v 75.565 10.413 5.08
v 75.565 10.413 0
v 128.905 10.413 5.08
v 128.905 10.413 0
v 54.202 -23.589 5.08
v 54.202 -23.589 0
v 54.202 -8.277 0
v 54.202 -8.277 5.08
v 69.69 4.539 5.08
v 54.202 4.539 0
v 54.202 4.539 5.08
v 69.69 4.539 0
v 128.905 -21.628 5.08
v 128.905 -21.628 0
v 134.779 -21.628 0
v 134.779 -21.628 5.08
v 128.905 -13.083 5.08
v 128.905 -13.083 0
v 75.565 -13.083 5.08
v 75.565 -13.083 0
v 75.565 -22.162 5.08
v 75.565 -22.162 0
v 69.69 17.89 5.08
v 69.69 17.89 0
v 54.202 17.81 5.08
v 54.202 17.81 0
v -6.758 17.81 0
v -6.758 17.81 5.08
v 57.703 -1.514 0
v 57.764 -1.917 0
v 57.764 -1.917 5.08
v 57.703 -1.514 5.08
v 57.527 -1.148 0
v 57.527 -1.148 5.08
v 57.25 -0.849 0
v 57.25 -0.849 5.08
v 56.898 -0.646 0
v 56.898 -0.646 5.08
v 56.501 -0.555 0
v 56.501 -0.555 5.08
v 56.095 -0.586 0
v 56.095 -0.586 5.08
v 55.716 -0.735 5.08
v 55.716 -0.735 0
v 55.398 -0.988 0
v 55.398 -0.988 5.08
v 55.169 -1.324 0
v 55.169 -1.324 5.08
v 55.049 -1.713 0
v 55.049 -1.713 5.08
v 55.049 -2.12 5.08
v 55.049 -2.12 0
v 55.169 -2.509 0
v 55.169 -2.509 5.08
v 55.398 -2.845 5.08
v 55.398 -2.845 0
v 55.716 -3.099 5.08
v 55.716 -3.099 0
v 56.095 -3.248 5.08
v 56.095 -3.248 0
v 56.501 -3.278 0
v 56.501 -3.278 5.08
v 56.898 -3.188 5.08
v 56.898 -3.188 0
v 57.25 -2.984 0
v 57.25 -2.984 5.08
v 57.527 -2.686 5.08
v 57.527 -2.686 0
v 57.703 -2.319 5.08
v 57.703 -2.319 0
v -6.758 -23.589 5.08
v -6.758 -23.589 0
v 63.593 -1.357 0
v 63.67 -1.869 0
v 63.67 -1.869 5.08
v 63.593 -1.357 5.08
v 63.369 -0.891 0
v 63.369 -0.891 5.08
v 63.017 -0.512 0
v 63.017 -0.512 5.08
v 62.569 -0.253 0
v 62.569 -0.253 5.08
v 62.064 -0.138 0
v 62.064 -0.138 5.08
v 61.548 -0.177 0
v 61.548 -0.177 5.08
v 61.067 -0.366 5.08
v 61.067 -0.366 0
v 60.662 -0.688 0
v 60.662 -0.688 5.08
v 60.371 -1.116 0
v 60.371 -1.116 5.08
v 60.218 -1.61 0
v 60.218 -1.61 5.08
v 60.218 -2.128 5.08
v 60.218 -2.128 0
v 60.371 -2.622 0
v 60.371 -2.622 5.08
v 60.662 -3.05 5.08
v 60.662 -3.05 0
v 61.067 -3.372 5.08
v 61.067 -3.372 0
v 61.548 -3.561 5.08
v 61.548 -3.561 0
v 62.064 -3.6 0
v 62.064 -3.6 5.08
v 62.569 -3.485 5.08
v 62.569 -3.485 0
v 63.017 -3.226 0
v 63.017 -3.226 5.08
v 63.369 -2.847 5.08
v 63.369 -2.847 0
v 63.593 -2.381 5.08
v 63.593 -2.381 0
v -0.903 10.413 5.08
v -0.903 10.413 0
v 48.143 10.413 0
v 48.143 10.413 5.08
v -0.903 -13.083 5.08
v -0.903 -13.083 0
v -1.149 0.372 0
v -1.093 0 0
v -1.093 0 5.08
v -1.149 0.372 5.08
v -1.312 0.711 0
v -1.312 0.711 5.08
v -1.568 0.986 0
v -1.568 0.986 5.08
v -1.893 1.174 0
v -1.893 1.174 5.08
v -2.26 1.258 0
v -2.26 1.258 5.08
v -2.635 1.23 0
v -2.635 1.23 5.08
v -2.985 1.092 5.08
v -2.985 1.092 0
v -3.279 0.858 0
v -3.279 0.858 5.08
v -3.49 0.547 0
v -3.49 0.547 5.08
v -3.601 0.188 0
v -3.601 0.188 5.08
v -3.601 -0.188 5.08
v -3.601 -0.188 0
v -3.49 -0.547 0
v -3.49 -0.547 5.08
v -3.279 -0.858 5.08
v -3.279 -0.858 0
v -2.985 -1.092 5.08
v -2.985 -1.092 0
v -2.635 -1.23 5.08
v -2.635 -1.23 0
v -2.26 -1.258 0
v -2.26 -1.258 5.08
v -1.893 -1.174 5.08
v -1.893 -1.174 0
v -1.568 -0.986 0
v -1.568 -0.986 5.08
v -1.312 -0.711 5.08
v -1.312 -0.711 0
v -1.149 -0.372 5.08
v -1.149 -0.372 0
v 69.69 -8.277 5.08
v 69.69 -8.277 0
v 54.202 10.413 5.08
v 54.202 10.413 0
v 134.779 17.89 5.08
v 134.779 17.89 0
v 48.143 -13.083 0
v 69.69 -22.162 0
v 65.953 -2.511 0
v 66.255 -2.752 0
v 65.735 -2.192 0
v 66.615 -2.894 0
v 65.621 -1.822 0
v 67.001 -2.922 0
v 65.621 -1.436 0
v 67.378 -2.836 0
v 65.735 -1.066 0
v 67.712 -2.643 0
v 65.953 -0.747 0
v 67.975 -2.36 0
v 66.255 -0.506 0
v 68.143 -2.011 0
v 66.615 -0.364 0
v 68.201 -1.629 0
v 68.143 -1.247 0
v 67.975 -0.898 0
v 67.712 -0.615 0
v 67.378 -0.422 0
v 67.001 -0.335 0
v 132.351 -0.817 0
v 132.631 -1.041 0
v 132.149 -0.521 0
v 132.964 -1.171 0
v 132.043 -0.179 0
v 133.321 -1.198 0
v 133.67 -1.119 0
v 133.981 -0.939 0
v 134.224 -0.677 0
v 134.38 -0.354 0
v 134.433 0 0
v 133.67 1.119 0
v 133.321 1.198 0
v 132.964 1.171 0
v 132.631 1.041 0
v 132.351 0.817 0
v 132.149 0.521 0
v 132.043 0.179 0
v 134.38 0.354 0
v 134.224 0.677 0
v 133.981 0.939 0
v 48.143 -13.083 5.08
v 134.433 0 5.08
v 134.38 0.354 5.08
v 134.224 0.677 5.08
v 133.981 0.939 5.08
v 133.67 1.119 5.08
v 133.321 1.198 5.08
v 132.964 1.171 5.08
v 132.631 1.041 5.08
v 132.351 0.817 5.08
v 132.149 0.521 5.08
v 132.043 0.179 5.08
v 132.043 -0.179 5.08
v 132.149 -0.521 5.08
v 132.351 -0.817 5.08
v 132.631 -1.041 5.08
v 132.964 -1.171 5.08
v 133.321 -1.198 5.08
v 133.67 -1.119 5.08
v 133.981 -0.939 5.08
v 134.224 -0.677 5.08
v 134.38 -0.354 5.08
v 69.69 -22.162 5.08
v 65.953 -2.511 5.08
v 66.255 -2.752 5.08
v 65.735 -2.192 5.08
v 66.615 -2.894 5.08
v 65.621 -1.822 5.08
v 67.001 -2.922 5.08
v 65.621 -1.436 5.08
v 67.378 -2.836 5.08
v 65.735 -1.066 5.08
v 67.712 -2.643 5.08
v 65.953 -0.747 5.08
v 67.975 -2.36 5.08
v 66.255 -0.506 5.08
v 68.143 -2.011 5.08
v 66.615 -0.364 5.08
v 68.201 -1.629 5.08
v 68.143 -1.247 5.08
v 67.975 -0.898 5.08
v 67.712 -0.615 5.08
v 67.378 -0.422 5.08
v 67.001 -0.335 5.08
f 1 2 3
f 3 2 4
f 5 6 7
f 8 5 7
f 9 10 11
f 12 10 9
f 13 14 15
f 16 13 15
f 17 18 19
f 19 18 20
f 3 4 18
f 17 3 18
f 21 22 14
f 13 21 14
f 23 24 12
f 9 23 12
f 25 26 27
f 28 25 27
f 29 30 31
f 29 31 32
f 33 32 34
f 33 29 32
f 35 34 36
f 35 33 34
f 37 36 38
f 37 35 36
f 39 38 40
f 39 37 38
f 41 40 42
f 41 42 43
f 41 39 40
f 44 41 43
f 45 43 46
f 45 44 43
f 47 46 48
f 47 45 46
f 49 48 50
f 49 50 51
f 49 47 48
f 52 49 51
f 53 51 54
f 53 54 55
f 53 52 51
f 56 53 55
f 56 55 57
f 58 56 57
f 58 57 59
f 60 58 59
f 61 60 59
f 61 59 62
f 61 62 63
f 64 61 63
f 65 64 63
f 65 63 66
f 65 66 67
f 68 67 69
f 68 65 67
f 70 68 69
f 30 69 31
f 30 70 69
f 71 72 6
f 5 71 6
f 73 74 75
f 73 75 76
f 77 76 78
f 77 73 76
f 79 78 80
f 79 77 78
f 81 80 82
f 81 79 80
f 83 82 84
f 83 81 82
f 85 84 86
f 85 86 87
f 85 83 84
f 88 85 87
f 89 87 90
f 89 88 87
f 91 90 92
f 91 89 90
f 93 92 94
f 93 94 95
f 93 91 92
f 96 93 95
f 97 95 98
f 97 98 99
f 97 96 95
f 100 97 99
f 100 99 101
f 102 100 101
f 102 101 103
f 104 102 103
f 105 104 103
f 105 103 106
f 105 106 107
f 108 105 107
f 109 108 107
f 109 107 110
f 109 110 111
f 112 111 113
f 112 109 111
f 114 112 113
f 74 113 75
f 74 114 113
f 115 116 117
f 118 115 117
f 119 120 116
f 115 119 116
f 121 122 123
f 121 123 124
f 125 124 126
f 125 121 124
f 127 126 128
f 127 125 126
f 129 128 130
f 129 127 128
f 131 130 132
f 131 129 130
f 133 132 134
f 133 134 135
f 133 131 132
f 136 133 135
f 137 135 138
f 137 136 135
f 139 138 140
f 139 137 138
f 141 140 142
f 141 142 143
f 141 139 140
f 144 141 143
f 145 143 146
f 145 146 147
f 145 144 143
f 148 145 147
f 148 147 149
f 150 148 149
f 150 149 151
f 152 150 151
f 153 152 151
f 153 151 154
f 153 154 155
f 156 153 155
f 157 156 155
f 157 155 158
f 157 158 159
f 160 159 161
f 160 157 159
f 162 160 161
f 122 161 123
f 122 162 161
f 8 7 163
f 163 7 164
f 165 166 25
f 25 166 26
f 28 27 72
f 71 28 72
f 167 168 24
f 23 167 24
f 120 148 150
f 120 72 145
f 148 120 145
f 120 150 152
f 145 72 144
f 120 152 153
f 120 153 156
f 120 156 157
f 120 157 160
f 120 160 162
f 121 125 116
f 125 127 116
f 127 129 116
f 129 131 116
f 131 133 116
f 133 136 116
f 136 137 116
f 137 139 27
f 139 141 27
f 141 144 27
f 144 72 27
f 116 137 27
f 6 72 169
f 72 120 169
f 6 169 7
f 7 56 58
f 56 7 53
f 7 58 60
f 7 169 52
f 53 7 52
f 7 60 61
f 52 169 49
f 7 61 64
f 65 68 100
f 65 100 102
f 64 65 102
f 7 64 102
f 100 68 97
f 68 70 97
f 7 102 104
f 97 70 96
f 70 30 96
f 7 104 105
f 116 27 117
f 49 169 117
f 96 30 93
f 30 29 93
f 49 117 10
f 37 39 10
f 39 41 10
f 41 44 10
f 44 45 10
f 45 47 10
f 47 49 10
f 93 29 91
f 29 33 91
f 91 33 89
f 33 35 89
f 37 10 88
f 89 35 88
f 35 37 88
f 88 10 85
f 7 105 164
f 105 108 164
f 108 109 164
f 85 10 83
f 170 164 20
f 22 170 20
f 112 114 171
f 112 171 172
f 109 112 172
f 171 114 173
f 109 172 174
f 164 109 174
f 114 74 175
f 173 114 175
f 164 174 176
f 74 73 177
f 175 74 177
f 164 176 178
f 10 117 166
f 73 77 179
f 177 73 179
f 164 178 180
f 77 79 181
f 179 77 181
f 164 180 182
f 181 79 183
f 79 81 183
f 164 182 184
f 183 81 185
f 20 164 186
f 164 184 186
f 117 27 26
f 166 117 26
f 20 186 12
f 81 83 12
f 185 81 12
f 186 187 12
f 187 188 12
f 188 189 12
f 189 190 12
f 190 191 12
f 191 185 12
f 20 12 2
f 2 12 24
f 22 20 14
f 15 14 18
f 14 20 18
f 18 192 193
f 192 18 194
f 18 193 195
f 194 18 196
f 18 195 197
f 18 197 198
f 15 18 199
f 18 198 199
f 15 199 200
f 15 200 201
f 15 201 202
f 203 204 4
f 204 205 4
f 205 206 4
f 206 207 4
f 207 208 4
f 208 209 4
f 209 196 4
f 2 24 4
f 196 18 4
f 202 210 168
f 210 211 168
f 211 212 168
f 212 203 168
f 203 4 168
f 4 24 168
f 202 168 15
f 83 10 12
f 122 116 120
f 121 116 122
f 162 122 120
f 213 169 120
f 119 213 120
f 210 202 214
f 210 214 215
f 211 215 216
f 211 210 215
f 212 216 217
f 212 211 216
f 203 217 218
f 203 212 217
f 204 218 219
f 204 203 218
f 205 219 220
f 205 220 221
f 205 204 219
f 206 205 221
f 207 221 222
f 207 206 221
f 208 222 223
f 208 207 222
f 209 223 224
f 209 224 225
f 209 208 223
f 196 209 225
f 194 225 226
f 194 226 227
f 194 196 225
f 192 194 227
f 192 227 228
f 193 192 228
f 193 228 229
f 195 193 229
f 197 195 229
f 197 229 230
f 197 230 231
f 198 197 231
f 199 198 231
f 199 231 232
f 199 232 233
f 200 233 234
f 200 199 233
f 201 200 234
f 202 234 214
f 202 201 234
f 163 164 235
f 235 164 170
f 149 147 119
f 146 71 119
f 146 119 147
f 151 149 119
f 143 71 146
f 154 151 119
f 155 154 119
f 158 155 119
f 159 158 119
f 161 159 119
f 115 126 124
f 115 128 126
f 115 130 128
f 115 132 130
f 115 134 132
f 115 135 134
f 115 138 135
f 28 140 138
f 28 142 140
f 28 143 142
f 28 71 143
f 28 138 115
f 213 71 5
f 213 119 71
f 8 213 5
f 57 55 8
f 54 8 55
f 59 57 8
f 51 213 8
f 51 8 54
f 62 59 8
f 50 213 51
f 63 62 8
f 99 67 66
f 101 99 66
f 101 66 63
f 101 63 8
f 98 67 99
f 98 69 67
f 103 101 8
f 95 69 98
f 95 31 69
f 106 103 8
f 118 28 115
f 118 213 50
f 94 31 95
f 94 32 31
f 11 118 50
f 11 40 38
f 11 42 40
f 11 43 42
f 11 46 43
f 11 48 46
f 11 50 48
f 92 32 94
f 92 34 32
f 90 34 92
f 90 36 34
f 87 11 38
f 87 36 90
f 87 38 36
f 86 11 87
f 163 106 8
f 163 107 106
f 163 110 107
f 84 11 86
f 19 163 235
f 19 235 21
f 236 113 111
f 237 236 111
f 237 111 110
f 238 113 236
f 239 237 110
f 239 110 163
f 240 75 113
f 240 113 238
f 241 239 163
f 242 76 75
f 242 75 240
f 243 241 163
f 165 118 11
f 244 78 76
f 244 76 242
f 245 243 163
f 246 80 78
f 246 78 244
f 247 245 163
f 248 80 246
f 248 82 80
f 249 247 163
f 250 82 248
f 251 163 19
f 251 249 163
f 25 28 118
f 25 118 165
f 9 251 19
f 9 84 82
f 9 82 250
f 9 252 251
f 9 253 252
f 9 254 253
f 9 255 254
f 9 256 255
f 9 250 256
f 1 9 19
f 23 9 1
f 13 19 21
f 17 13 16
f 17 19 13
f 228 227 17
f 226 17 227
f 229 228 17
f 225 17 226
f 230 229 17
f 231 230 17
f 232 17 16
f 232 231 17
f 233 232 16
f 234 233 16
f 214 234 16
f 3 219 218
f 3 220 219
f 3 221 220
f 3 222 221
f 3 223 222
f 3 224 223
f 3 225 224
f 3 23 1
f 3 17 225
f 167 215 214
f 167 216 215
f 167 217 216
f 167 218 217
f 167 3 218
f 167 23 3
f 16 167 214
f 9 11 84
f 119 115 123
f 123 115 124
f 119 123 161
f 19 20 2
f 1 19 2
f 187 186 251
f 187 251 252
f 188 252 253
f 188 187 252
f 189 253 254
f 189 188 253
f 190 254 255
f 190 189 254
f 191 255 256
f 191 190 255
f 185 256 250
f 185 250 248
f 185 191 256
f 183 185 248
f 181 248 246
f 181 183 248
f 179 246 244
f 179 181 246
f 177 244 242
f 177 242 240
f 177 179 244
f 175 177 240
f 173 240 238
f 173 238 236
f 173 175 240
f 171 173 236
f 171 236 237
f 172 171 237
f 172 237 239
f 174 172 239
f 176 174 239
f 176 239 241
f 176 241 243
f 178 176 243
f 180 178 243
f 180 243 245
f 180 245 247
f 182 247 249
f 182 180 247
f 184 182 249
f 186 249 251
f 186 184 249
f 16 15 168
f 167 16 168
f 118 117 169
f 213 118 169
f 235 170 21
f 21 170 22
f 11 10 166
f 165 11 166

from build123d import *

# Parameters (mm, degrees)
F0_W     = 53.34
F0_H     = 7.4762164177
F1_DEPTH = 5.08
F0_W_2   = 15.4877182819
F0_H_2   = 12.8163710635
F0_R     = 1.365180055
F0_R_2   = 1.7356876501
F0_R_3   = 1.2971240832
F2_DEPTH = 5.08
F0_R_4   = 1.201625658
F0_W_3   = 6.0593526471
F0_H_3   = 10.5057700578
F0_W_4   = 49.0457672859
F0_H_4   = 7.3963825689
F0_W_5   = 5.854880067
F0_H_5   = 23.4966807871
F0_R_5   = 1.2613504397
F3_DEPTH = 5.08


with BuildPart() as f1:
    # F0 (on Top) → F1 (new body)
    with BuildSketch(Plane.XY):
        with Locations((102.2345048122, 14.151409833)):
            Rectangle(F0_W, F0_H)
        Polygon((128.9045048122, 10.4133016241), (131.6407098506, 10.4133016241), (134.779159077, 10.4133016241), (134.779159077, 17.8895180418), (128.9045048122, 17.8895180418), align=None)
        Polygon((128.9045048122, -21.6276271147), (128.9045048122, -13.083379163), (75.5645048122, -13.083379163), (75.5645048122, -20.5595947167), (75.5645048122, -22.1616424497), align=None)
        Polygon((75.5645048122, -13.083379163), (75.5645048122, 10.4133016241), (75.5645048122, 17.8895180418), (69.6898505475, 17.8895180418), (69.6898505475, 4.5391316433), (69.6898505475, -8.2772394202), (69.6898505475, -22.1616424497), (75.5645048122, -22.1616424497), (75.5645048122, -20.5595947167), align=None)
    extrude(amount=F1_DEPTH)

    # F0 (on Top) → F2 (join)
    with BuildSketch(Plane.XY):
        with Locations((61.9459914065, -1.8690538884)):
            Rectangle(F0_W_2, F0_H_2)
        with Locations((56.3987791538, -1.916793175)):
            Circle(F0_R, mode=Mode.SUBTRACT)
        with Locations((61.9344774574, -1.8690538884)):
            Circle(F0_R_2, mode=Mode.SUBTRACT)
        with Locations((66.9036880136, -1.6289874911)):
            Circle(F0_R_3, mode=Mode.SUBTRACT)
    extrude(amount=F2_DEPTH)

    # F0 (on Top) → F3 (join)
    with BuildSketch(Plane.XY):
        Polygon((134.779159077, 10.4133016241), (131.6407098506, 10.4133016241), (128.9045048122, 10.4133016241), (128.9045048122, -13.083379163), (131.6407098506, -13.083379163), (134.779159077, -13.083379163), align=None)
        with Locations((133.2313663255, 0)):
            Circle(F0_R_4, mode=Mode.SUBTRACT)
        Polygon((131.6407098506, -13.083379163), (128.9045048122, -13.083379163), (128.9045048122, -21.6276271147), (134.779159077, -21.6276271147), (134.779159077, -13.083379163), align=None)
        with Locations((51.1724559421, -18.3362641919)):
            Rectangle(F0_W_3, F0_H_3)
        with Locations((23.6198959756, -18.3362641919)):
            Rectangle(F0_W_4, F0_H_3)
        Polygon((54.2021322656, -8.2772394202), (54.2021322656, 4.5391316433), (54.2021322656, 10.4133016241), (48.1427796185, 10.4133016241), (48.1427796185, -13.083379163), (54.2021322656, -13.083379163), align=None)
        with Locations((51.1724559421, 14.1114929086)):
            Rectangle(F0_W_3, F0_H_4)
        with Locations((23.6198959756, 14.1114929086)):
            Rectangle(F0_W_4, F0_H_4)
        with Locations((-3.8304277009, 14.1114929086)):
            Rectangle(F0_W_5, F0_H_4)
        with Locations((-3.8304277009, -18.3362641919)):
            Rectangle(F0_W_5, F0_H_3)
        with Locations((-3.8304277009, -1.3350387695)):
            Rectangle(F0_W_5, F0_H_5)
        with Locations((-2.3539937101, 0)):
            Circle(F0_R_5, mode=Mode.SUBTRACT)
    extrude(amount=F3_DEPTH)


solid = f1.part
